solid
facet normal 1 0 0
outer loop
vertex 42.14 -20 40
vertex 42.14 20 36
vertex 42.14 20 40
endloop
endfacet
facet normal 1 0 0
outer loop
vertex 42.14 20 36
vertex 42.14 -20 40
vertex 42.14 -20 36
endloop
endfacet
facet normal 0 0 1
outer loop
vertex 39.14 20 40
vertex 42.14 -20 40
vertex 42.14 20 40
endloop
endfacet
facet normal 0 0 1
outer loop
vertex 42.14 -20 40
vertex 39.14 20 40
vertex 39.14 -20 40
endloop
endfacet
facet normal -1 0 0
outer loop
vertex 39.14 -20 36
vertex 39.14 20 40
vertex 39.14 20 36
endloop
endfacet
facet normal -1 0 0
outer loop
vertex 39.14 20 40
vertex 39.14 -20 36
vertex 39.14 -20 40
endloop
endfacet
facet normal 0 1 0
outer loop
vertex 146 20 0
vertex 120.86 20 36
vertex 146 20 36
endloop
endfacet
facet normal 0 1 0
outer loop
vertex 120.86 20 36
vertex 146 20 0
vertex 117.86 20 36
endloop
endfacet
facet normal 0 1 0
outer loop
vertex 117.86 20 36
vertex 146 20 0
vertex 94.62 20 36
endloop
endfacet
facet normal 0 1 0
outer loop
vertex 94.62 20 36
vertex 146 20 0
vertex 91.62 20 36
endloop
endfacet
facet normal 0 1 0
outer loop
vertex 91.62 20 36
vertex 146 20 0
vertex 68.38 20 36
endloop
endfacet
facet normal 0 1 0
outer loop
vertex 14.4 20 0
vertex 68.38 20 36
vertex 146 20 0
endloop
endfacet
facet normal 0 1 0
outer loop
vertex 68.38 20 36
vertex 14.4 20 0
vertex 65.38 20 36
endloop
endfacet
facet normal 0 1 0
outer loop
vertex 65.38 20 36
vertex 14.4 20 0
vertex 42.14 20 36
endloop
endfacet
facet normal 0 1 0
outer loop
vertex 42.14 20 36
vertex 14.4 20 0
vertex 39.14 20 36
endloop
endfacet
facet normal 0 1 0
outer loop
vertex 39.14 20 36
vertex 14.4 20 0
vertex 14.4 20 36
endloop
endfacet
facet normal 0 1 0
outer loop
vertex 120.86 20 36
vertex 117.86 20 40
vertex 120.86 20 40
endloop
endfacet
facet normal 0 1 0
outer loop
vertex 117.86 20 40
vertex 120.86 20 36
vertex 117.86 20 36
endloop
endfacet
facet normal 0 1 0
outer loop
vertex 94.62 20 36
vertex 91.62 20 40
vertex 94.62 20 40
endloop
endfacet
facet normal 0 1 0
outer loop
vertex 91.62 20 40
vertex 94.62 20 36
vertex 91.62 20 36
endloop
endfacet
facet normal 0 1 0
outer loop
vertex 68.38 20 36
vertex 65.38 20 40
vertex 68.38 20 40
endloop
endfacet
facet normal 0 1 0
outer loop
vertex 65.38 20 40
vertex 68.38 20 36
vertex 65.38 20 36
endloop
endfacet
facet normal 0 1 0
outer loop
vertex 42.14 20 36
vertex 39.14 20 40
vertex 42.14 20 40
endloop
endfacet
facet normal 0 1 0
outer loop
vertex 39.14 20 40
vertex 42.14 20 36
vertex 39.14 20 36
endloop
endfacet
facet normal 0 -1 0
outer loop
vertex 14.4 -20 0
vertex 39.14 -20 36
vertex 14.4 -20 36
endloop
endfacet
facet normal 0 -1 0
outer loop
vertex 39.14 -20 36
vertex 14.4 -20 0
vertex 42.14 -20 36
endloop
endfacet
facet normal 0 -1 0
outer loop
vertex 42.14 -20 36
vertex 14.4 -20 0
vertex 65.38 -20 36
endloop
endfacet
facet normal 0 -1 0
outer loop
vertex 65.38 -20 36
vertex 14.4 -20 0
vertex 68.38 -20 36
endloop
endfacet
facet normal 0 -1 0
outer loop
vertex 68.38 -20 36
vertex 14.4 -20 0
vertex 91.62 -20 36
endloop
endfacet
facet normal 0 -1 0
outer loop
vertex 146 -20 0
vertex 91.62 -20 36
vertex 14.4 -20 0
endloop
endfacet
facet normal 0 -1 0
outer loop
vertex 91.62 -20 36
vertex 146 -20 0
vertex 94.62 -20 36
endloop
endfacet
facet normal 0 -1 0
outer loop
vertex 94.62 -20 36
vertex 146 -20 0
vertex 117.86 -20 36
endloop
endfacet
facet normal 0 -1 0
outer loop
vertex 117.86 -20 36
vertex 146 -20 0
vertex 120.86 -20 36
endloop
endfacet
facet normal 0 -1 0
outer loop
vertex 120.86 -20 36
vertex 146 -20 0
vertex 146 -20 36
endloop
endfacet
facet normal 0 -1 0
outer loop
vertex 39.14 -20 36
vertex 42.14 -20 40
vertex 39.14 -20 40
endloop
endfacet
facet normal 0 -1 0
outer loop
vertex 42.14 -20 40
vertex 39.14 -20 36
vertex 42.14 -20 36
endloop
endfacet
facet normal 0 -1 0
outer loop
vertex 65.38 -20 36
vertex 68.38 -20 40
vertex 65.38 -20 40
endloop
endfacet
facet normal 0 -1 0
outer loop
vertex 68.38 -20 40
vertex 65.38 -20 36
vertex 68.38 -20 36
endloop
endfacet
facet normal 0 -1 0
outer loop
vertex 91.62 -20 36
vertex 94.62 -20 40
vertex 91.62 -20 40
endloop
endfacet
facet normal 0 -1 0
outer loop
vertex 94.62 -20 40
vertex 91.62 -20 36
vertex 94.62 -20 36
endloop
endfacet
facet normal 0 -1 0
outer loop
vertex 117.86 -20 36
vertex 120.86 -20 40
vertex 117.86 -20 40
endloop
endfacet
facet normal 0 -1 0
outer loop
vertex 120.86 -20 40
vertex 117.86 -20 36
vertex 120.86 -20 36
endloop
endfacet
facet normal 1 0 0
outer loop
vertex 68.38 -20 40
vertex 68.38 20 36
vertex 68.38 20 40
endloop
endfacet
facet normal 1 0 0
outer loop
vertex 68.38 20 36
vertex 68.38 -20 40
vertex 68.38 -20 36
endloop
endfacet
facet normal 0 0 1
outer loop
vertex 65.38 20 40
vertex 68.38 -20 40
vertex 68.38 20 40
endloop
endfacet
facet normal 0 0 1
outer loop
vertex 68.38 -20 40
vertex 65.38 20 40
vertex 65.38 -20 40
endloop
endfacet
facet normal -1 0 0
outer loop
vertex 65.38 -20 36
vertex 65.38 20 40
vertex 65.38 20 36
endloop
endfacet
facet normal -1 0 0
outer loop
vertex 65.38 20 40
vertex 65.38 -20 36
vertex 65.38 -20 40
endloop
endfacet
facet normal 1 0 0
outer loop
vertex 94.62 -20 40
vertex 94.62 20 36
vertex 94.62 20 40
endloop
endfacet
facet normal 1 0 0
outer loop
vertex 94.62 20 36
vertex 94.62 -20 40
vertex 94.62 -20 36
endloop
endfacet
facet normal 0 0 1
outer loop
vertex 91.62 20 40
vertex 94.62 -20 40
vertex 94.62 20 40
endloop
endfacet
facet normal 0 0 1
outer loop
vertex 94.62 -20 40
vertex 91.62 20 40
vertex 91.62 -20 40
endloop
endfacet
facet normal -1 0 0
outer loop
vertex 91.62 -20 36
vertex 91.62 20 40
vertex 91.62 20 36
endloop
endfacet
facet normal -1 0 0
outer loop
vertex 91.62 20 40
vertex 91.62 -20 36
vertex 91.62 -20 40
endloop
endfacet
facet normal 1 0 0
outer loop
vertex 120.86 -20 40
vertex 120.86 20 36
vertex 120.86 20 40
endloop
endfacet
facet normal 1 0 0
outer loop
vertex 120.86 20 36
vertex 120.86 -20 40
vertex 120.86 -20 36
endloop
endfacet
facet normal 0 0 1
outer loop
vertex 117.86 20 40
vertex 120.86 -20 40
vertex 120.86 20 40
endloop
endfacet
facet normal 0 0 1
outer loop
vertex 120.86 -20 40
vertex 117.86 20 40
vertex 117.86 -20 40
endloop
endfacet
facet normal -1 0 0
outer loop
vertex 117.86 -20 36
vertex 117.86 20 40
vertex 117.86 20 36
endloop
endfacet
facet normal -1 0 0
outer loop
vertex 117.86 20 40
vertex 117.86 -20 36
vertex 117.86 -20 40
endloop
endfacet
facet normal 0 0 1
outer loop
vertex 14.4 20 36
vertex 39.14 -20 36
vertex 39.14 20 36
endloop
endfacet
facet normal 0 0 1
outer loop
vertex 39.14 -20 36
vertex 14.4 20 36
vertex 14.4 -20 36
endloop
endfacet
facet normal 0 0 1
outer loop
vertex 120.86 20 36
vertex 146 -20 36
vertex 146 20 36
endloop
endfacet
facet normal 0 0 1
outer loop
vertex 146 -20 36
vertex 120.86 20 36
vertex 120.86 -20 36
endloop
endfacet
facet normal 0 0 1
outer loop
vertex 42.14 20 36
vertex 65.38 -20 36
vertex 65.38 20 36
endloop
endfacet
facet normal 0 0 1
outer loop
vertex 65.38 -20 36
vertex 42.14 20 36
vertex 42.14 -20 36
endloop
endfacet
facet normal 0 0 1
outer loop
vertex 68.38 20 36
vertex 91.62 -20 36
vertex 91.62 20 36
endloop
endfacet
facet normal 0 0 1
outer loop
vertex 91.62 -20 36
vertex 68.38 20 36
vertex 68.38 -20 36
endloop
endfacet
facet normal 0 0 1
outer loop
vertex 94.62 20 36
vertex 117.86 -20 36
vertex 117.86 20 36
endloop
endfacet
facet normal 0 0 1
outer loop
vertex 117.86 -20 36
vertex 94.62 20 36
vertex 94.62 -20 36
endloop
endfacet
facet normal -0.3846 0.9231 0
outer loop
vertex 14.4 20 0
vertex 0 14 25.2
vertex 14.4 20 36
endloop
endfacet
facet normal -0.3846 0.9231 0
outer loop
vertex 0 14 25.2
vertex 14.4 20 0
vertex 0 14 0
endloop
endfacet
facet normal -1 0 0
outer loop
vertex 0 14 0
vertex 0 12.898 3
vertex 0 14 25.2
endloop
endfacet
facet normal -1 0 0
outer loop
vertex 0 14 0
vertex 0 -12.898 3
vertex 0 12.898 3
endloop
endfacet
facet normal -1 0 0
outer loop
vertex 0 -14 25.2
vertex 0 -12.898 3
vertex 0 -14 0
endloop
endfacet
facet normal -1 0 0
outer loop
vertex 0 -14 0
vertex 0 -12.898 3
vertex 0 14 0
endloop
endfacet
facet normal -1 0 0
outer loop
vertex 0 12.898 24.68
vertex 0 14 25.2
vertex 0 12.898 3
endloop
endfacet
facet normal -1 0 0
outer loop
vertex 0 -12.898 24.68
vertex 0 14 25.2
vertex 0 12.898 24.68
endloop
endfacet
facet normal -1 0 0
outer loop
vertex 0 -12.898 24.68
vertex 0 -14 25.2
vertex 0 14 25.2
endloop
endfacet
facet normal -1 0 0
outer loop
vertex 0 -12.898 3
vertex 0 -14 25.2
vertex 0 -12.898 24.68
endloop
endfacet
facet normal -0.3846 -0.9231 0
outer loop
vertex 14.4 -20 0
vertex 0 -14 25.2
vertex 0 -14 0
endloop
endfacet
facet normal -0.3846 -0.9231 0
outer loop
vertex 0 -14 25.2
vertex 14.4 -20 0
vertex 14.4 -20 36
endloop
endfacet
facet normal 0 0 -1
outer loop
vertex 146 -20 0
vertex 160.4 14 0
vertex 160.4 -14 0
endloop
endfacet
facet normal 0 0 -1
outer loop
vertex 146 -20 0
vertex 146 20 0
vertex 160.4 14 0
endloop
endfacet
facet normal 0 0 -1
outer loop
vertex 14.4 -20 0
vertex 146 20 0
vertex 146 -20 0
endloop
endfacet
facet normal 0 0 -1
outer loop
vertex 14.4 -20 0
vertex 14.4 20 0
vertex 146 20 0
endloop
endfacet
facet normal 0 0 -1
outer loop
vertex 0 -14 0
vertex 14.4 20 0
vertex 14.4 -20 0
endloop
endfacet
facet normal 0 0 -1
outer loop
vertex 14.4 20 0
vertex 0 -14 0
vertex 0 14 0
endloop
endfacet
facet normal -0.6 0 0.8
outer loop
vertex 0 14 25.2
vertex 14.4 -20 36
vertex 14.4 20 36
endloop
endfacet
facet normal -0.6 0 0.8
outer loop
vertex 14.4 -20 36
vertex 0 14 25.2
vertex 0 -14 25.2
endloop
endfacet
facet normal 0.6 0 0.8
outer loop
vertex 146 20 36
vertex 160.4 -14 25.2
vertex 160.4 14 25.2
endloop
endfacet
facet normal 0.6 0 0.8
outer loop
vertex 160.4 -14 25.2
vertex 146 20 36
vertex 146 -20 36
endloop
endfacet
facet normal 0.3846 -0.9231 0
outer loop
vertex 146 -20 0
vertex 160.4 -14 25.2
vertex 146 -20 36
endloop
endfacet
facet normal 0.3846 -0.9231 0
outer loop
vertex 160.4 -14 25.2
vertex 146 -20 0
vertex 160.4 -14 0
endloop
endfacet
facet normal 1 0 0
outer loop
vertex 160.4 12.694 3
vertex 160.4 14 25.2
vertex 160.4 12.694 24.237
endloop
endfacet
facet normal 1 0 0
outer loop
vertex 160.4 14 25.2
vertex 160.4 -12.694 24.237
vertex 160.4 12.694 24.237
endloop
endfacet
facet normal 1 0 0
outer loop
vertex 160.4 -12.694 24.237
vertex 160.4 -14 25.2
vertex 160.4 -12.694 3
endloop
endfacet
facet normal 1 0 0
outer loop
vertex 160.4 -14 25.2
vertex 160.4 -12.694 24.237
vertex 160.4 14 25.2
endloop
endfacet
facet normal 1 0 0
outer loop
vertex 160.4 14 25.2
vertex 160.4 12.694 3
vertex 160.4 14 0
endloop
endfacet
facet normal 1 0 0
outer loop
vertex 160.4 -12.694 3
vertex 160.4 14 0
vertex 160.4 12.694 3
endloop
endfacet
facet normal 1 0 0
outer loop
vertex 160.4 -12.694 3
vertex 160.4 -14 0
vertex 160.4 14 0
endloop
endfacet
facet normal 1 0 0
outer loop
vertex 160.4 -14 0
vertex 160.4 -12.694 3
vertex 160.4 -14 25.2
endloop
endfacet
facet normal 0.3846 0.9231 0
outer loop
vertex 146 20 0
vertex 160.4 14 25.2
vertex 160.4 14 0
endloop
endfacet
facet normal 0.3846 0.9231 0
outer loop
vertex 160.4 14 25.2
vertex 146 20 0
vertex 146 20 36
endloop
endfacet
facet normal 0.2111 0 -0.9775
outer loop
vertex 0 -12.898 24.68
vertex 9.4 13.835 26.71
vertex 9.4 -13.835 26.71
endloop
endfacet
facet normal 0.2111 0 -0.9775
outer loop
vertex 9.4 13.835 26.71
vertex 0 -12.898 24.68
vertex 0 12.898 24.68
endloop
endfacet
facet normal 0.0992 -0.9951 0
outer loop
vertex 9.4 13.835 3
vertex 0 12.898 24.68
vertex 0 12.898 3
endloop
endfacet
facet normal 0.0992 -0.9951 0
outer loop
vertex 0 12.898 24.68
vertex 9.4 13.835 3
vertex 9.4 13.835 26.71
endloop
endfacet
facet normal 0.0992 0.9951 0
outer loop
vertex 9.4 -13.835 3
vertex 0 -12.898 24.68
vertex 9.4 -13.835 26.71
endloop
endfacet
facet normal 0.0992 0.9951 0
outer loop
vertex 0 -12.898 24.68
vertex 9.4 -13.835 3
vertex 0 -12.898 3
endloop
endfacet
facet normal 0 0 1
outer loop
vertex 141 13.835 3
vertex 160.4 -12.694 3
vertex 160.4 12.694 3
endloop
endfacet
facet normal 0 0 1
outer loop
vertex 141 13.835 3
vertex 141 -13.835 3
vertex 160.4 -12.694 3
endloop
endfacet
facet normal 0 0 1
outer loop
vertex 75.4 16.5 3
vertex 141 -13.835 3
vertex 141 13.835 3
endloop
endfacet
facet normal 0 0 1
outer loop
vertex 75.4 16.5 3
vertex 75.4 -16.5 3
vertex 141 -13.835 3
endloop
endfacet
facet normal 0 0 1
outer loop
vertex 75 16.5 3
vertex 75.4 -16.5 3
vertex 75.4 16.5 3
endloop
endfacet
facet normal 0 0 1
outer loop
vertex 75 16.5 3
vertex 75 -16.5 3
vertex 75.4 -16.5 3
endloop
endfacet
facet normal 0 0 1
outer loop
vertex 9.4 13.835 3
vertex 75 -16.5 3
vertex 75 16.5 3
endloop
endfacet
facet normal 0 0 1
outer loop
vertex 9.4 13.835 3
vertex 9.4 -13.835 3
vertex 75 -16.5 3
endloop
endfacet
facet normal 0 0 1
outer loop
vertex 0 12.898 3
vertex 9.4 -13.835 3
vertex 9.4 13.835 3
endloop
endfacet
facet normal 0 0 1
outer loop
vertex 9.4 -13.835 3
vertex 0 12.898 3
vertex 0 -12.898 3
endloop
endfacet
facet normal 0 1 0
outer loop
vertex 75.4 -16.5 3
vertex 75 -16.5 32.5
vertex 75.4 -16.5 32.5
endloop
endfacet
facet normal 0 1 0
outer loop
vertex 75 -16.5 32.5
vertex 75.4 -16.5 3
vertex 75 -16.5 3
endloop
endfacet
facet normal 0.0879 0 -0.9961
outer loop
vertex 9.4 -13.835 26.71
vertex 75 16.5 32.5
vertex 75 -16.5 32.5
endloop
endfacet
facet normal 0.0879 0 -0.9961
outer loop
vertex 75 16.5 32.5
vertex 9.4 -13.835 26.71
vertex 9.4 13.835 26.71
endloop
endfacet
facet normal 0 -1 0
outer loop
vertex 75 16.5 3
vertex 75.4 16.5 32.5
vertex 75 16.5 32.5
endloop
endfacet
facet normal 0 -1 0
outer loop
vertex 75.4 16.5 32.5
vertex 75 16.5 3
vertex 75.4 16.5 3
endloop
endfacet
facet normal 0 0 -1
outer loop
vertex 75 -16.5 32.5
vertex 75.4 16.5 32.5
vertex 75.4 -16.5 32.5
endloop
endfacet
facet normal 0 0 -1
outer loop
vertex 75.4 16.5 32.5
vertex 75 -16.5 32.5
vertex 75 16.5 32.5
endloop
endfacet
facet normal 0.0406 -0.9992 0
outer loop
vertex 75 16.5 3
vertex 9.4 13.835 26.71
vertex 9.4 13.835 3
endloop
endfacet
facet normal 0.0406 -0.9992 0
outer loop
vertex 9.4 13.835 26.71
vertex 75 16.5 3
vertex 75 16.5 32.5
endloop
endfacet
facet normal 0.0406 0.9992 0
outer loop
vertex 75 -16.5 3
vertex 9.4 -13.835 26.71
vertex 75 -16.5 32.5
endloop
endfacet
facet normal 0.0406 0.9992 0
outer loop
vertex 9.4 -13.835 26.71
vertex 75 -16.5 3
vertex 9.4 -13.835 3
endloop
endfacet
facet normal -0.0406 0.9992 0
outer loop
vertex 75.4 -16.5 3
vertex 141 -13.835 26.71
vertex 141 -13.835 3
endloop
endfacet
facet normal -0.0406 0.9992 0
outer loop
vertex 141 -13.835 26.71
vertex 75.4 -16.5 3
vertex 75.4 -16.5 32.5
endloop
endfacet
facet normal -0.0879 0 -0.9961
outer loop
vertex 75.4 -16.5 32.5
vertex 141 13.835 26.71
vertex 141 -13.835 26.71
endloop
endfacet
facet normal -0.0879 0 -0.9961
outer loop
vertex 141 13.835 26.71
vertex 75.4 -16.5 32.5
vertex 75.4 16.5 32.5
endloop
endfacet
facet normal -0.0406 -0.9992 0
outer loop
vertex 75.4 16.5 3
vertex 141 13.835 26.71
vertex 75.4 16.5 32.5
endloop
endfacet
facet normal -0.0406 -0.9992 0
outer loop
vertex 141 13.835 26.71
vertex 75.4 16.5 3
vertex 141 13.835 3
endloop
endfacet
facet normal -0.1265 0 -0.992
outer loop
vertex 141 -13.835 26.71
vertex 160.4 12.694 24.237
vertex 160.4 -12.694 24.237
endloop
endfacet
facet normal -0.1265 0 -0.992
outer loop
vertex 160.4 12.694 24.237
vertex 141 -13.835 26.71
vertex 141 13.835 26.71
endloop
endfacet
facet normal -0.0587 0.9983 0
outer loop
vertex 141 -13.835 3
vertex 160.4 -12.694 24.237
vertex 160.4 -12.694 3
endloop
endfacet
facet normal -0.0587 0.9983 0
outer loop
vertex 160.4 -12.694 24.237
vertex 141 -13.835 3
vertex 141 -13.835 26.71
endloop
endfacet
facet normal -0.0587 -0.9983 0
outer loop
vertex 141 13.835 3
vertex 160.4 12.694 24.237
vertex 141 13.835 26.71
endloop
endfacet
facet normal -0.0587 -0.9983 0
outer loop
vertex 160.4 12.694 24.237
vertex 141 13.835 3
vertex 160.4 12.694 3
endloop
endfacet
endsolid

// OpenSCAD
$fn = 32;

// ----------------------------------------------------------------------
// Faired channel: 160 x 40 x 36 mm, 3.5 mm walls, faired ends
// ----------------------------------------------------------------------

// --- parameters (mm) ---
length = 160;             // channel length
width = 40;               // channel width at mid length
height = 36;              // channel height at mid length
wall = 3.5;               // side wall thickness
floor_t = 3;              // floor thickness
end_w = 28;               // faired end width
end_h = 25.2;             // faired end height
ribs = 4;                 // stiffening ribs on the top
rib_t = 3;                // rib thickness
rib_h = 4;                // rib height

difference() {
  union() {
    hull() {
      translate([0, -14, 0]) cube([0.4, 28, 25.2]);
      translate([14.4, -20, 0]) cube([0.4, 40, 36]);
    }
    hull() {
      translate([14.4, -20, 0]) cube([0.4, 40, 36]);
      translate([80, -20, 0]) cube([0.4, 40, 36]);
    }
    hull() {
      translate([80, -20, 0]) cube([0.4, 40, 36]);
      translate([145.6, -20, 0]) cube([0.4, 40, 36]);
    }
    hull() {
      translate([145.6, -20, 0]) cube([0.4, 40, 36]);
      translate([160, -14, 0]) cube([0.4, 28, 25.2]);
    }
    /* stiffening ribs across the flat top, sunk 0.8 mm into it */
    for (i = [1 : ribs]) {
      translate([14.4 + i * (length - 2 * 14.4) / (ribs + 1) - rib_t / 2, -width / 2, height - 0.8]) cube([rib_t, width, rib_h + 0.8]);
    }
  }
  /* cavity, 5 mm proud of both ends so the ports are cut clean */
  hull() {
    translate([-5, -12.4, 3]) cube([0.4, 24.8, 20.6]);
    translate([9.4, -13.835, 3]) cube([0.4, 27.67, 23.71]);
  }
  hull() {
    translate([9.4, -13.835, 3]) cube([0.4, 27.67, 23.71]);
    translate([75, -16.5, 3]) cube([0.4, 33, 29.5]);
  }
  hull() {
    translate([75, -16.5, 3]) cube([0.4, 33, 29.5]);
    translate([140.6, -13.835, 3]) cube([0.4, 27.67, 23.71]);
  }
  hull() {
    translate([140.6, -13.835, 3]) cube([0.4, 27.67, 23.71]);
    translate([165, -12.4, 3]) cube([0.4, 24.8, 20.6]);
  }
}
